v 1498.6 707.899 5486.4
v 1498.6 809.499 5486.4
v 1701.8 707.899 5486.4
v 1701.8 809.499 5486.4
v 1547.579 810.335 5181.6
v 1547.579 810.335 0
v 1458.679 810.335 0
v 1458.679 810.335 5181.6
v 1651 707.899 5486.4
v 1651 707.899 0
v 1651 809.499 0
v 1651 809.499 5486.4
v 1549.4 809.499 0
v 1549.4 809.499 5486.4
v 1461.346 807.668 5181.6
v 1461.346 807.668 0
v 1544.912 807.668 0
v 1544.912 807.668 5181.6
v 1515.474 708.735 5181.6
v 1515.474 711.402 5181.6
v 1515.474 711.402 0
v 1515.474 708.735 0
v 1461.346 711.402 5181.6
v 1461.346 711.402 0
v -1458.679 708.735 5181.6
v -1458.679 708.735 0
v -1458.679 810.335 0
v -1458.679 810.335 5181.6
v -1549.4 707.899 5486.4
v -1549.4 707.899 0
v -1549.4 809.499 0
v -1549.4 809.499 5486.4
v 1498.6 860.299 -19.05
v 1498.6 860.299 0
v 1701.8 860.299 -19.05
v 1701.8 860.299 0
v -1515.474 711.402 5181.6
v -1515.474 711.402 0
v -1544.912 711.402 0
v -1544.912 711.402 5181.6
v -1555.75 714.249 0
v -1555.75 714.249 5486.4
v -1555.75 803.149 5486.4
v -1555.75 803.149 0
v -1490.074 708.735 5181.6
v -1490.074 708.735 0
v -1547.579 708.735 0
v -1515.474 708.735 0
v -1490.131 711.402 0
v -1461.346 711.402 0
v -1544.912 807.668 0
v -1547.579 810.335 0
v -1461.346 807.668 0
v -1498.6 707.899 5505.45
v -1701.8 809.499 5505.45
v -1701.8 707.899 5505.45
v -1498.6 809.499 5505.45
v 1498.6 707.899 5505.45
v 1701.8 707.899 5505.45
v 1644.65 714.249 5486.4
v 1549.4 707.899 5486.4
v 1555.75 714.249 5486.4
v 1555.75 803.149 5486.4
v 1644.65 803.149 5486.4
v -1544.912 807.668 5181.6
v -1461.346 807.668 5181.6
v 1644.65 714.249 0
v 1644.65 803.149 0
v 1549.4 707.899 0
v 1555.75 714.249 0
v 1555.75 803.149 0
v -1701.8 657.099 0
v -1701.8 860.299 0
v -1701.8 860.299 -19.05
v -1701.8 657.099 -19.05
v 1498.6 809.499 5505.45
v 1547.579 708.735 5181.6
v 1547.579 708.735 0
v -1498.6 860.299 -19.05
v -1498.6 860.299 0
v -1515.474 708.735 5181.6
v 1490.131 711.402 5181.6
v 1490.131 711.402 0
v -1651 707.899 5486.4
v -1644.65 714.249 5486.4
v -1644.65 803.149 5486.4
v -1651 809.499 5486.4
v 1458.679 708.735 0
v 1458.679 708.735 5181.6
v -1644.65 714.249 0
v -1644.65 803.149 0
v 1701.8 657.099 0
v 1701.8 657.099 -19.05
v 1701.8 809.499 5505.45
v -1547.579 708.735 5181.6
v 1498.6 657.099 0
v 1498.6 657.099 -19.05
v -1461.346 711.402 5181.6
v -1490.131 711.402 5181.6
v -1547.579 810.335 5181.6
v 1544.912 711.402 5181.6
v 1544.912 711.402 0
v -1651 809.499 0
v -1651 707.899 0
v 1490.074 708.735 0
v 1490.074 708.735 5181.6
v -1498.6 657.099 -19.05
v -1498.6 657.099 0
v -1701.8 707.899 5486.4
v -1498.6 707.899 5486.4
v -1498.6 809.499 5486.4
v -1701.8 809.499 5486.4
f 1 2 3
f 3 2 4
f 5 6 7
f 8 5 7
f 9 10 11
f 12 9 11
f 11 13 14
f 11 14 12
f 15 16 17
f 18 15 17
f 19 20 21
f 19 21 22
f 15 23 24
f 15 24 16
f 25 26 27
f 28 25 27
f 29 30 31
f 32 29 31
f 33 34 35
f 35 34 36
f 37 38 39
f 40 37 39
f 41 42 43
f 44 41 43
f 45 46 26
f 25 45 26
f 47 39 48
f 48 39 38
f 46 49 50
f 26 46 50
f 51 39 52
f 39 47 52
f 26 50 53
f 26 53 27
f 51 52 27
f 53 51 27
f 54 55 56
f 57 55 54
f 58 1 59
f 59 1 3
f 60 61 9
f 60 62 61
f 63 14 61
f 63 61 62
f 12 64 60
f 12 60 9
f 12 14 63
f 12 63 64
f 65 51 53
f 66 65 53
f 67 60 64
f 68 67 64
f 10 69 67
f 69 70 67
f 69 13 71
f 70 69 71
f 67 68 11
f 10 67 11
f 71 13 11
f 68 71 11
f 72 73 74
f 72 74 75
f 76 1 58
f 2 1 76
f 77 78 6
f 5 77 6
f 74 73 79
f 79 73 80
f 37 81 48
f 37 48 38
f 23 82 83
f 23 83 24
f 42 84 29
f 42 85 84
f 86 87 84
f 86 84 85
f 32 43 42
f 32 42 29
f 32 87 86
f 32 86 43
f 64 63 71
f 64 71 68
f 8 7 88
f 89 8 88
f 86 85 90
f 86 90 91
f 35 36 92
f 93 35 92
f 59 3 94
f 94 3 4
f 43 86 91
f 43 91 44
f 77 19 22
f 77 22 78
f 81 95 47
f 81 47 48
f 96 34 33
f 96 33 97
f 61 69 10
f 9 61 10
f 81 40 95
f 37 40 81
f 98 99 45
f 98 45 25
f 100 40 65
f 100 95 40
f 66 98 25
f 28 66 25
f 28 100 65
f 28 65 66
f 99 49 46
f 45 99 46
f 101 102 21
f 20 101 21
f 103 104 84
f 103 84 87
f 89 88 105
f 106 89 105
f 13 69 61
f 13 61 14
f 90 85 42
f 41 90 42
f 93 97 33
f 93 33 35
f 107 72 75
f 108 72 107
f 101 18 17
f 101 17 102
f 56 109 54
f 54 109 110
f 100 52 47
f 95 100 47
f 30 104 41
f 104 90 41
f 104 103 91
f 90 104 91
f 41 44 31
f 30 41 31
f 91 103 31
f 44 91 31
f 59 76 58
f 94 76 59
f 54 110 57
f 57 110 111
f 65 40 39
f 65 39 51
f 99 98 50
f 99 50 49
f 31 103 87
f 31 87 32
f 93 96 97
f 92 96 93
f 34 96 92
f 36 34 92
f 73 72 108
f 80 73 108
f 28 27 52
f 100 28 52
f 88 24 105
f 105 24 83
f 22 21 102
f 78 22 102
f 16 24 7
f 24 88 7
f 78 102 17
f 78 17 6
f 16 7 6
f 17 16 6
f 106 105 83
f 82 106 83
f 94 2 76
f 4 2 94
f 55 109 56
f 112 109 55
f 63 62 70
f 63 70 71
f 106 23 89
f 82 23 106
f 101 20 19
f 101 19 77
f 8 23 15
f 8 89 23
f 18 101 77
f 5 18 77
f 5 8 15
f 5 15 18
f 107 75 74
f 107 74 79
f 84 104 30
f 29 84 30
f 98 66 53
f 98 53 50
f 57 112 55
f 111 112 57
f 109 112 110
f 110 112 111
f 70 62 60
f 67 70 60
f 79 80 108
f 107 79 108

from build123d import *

# Parameters (mm, degrees)
F0_W     = 101.6
F0_H     = 101.6
F0_W_2   = 88.9
F0_H_2   = 88.9
F1_DEPTH = 5486.4
F2_W     = 203.2
F2_H     = 203.2
F3_DEPTH = 19.05
F4_W     = 203.2
F4_H     = 101.6
F5_DEPTH = 19.05
F7_DEPTH = 5181.6


with BuildPart() as f1:
    # F0 (on Top) → F1 (new body)
    with BuildSketch(Plane.XY):
        with Locations((-1600.2, 758.698753)):
            Rectangle(F0_W, F0_H)
        with Locations((-1600.2, 758.698753)):
            Rectangle(F0_W_2, F0_H_2, mode=Mode.SUBTRACT)
        with Locations((1600.2, 758.698753)):
            Rectangle(F0_W, F0_H)
        with Locations((1600.2, 758.698753)):
            Rectangle(F0_W_2, F0_H_2, mode=Mode.SUBTRACT)
    extrude(amount=F1_DEPTH)


with BuildPart() as f3:
    # F2 (on face) → F3 (new body)
    with BuildSketch(Plane(origin=(0, 0, 0), x_dir=(1, 0, 0), z_dir=(0, 0, -1))):
        with Locations((-1600.2, -758.698753)):
            Rectangle(F2_W, F2_H)
        with Locations((1600.2, -758.698753)):
            Rectangle(F2_W, F2_H)
    extrude(amount=F3_DEPTH)


with BuildPart() as f5:
    # F4 (on face) → F5 (new body)
    with BuildSketch(Plane.XY.offset(5486.4)):
        with Locations((-1600.2, 758.698753)):
            Rectangle(F4_W, F4_H)
        with Locations((1600.2, 758.698753)):
            Rectangle(F4_W, F4_H)
    extrude(amount=F5_DEPTH)


with BuildPart() as f7:
    # F6 (on face) → F7 (new body)
    with BuildSketch(Plane.XY):
        Polygon((-1547.579288, 810.335406), (-1547.579288, 708.735406), (-1515.474194, 708.735406), (-1515.474194, 711.402406), (-1544.912288, 711.402406), (-1544.912288, 807.668406), (-1461.346288, 807.668406), (-1461.346288, 711.402406), (-1490.131021, 711.402406), (-1490.074194, 708.735406), (-1458.679288, 708.735406), (-1458.679288, 810.335406), align=None)
        Polygon((1490.074194, 708.735406), (1490.131021, 711.402406), (1461.346288, 711.402406), (1461.346288, 807.668406), (1544.912288, 807.668406), (1544.912288, 711.402406), (1515.474194, 711.402406), (1515.474194, 708.735406), (1547.579288, 708.735406), (1547.579288, 810.335406), (1458.679288, 810.335406), (1458.679288, 708.735406), align=None)
    extrude(amount=F7_DEPTH)


solid = Compound([f1.part, f3.part, f5.part, f7.part])
